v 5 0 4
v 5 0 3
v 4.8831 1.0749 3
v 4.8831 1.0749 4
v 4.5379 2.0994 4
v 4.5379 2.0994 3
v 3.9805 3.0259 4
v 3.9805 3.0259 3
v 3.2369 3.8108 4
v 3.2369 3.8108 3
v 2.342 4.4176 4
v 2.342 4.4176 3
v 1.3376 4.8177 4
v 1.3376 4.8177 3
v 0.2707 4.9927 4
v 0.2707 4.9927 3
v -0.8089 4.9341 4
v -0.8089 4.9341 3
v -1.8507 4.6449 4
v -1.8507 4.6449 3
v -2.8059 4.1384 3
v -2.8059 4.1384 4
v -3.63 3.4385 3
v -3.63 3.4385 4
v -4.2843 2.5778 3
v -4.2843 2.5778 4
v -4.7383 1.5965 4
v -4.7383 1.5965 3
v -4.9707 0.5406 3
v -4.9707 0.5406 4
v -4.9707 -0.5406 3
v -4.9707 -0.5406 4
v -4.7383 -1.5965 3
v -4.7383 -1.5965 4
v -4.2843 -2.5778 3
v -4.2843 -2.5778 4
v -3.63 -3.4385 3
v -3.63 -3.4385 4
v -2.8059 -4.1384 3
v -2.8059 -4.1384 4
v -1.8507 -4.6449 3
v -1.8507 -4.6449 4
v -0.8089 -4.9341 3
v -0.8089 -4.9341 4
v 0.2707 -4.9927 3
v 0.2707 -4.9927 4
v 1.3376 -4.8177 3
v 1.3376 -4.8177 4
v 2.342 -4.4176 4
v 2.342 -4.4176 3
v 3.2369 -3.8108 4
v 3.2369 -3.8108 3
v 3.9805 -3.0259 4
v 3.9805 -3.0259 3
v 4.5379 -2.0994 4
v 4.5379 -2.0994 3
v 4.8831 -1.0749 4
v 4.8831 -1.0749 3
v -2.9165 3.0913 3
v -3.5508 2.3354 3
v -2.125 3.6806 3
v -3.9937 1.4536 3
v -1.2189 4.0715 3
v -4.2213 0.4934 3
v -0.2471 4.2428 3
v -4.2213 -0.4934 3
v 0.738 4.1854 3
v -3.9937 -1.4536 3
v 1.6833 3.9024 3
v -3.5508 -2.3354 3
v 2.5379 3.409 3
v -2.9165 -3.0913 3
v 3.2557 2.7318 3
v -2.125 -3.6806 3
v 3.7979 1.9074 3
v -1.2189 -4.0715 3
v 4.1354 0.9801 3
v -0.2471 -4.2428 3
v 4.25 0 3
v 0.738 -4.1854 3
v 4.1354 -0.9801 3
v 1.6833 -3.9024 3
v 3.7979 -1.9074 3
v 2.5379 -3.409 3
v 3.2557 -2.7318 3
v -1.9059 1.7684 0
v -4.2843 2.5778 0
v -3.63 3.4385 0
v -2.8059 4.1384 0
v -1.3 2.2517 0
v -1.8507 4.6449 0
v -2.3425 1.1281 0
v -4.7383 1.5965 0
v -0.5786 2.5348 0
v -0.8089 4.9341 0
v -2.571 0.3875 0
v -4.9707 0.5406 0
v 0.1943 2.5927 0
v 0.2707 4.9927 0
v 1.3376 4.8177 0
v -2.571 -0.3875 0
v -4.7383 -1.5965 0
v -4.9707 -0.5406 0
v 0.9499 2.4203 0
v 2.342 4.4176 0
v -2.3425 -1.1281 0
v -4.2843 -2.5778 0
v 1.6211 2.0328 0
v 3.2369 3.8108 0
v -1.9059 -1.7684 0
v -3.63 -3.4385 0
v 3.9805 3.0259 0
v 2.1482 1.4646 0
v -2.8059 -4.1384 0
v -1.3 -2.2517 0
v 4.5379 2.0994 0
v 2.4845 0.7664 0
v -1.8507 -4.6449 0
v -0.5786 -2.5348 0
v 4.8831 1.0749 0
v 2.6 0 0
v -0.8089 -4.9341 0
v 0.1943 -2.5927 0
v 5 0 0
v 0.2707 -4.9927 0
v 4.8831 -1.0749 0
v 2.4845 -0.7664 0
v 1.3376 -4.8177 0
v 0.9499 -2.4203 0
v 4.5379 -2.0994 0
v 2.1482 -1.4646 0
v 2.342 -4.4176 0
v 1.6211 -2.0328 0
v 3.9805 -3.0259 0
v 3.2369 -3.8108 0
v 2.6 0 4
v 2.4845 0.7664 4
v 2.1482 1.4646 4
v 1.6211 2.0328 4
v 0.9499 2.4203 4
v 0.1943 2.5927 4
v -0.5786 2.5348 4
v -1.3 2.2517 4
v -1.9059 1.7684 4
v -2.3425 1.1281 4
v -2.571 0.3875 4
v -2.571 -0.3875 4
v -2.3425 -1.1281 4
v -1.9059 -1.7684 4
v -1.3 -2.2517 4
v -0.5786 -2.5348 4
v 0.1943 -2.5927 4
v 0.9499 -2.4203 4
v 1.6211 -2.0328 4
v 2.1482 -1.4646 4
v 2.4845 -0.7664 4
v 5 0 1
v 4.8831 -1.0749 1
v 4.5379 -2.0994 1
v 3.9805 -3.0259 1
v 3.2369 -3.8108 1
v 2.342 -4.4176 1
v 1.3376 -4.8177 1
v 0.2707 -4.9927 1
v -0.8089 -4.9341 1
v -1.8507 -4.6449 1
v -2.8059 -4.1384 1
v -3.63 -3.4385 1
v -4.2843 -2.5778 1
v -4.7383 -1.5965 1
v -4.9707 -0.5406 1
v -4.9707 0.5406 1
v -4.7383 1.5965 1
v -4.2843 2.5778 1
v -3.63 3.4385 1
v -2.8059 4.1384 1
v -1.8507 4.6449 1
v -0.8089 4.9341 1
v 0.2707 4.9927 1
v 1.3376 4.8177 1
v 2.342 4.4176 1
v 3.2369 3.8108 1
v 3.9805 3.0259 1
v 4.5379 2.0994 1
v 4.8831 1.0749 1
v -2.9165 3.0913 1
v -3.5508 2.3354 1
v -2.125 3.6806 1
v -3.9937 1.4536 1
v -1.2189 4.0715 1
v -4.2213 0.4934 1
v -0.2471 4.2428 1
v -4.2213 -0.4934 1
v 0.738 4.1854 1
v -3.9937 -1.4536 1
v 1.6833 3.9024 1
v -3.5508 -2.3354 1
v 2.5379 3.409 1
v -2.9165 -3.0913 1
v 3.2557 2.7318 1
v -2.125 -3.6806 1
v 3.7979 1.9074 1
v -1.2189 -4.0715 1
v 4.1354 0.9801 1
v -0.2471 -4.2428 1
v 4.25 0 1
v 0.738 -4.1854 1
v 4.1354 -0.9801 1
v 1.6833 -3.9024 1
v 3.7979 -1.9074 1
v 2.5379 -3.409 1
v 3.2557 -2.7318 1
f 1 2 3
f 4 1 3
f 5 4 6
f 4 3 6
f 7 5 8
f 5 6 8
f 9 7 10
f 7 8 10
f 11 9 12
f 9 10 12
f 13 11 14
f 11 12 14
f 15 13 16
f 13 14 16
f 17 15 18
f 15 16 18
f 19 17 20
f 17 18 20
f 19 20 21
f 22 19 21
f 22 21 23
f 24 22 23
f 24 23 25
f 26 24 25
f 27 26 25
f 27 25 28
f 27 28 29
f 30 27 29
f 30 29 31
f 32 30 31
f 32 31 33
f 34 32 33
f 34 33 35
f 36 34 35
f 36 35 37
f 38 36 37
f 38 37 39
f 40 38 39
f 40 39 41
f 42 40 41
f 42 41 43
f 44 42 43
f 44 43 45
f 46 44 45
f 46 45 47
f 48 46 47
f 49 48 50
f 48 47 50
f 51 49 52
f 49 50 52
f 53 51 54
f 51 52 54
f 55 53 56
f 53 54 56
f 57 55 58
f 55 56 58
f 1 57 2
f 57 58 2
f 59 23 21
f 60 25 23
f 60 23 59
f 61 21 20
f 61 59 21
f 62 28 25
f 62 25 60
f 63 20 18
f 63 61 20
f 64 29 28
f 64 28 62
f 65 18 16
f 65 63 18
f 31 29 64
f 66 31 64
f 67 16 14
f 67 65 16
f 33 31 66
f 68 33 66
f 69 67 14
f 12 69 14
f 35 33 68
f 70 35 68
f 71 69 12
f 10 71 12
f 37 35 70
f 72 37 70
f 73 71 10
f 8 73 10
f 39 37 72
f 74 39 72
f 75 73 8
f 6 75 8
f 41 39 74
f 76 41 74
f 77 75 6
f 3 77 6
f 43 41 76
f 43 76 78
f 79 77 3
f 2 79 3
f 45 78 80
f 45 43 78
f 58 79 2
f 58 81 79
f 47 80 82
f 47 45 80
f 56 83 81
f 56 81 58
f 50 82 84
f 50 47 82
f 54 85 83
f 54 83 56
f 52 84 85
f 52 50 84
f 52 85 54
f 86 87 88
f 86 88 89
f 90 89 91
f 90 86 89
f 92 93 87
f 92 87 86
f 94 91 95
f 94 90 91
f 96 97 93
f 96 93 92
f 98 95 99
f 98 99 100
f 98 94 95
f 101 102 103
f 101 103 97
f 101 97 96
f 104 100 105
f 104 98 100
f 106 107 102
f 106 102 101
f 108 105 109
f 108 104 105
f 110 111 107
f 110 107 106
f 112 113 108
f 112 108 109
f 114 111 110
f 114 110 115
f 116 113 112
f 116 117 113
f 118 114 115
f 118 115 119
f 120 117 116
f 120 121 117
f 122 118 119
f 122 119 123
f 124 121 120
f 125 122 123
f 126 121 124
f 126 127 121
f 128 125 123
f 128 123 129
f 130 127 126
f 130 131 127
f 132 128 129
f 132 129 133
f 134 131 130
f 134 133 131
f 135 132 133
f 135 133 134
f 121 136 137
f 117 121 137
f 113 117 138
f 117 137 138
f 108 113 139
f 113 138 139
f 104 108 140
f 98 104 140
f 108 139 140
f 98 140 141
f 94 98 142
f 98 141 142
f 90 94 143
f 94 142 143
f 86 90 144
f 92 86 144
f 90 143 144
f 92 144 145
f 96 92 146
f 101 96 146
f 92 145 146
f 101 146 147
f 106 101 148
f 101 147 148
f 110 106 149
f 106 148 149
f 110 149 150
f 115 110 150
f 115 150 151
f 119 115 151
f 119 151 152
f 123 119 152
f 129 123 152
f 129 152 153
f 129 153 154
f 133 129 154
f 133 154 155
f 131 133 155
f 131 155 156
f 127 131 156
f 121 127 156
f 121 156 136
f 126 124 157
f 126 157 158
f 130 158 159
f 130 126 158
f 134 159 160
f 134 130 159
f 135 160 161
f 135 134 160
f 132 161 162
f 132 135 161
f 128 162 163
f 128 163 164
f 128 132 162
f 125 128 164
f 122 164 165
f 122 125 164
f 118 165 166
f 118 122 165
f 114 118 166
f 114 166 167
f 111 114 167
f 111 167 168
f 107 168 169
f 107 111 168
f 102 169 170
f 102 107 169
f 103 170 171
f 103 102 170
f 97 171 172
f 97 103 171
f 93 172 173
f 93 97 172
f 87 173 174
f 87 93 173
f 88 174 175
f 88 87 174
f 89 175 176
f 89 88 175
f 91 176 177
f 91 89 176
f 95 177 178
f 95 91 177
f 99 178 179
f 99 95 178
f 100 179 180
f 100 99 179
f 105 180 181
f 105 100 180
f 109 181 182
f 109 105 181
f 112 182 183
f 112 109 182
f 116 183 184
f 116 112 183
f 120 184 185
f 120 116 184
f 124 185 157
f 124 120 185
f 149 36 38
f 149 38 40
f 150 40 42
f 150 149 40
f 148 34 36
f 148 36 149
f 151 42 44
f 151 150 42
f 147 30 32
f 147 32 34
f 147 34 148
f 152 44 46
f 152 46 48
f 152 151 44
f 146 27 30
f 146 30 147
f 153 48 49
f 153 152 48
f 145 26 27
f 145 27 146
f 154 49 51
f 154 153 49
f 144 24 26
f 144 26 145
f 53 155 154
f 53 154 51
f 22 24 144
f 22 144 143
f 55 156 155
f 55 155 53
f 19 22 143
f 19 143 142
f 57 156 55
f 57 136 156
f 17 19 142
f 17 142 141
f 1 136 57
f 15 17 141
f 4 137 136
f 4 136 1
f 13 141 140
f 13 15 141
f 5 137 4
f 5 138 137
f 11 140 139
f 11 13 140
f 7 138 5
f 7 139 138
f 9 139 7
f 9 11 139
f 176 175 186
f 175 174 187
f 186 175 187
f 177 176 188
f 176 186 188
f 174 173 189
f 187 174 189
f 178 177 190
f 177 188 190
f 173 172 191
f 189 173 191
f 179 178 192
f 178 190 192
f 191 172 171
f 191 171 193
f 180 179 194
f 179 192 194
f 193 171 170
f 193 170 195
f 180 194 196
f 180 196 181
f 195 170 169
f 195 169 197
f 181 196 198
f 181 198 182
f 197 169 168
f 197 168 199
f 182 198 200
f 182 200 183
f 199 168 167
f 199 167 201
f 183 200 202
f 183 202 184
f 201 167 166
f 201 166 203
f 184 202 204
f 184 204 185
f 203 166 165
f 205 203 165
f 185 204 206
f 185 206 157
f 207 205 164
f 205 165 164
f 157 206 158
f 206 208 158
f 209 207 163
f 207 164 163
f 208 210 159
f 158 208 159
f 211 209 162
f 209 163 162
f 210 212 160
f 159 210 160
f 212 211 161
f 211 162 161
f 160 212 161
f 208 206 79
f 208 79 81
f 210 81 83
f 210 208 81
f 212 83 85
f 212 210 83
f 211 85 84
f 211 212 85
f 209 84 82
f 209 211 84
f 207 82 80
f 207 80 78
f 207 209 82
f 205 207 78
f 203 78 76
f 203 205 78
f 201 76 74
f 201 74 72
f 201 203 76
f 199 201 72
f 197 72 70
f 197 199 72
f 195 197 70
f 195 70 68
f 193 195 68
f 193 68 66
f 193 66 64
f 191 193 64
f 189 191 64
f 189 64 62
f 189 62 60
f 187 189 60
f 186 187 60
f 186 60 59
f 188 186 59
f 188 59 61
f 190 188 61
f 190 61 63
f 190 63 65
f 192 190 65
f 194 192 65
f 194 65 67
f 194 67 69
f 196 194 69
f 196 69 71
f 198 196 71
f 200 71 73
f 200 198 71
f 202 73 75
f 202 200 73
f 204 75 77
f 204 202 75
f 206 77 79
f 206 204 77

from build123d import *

# Parameters (mm, degrees)
F0_R     = 5
F1_DEPTH = 4
F3_R     = 5
F3_R_2   = 4.25
F4_DEPTH = 3
F2_R     = 2.6
F5_DEPTH = 4.001
F6_DEPTH = 1


with BuildPart() as f1:
    # F0 (on Top) → F1 (new body)
    with BuildSketch(Plane.XY):
        Circle(F0_R)
    extrude(amount=F1_DEPTH)

    # F3 (on face) → F4 (cut)
    with BuildSketch(Plane(origin=(0, 0, 0), x_dir=(1, 0, 0), z_dir=(0, 0, -1))):
        Circle(F3_R)
        Circle(F3_R_2, mode=Mode.SUBTRACT)
    extrude(amount=-F4_DEPTH, mode=Mode.SUBTRACT)

    # F2 (on face) → F5 (cut, through all)
    with BuildSketch(Plane.XY.offset(4)):
        Circle(F2_R)
    extrude(amount=-F5_DEPTH, mode=Mode.SUBTRACT)

    # F3 (on face) → F6 (join)
    with BuildSketch(Plane(origin=(0, 0, 0), x_dir=(1, 0, 0), z_dir=(0, 0, -1))):
        Circle(F3_R)
        Circle(F3_R_2, mode=Mode.SUBTRACT)
    extrude(amount=-F6_DEPTH)


solid = f1.part
